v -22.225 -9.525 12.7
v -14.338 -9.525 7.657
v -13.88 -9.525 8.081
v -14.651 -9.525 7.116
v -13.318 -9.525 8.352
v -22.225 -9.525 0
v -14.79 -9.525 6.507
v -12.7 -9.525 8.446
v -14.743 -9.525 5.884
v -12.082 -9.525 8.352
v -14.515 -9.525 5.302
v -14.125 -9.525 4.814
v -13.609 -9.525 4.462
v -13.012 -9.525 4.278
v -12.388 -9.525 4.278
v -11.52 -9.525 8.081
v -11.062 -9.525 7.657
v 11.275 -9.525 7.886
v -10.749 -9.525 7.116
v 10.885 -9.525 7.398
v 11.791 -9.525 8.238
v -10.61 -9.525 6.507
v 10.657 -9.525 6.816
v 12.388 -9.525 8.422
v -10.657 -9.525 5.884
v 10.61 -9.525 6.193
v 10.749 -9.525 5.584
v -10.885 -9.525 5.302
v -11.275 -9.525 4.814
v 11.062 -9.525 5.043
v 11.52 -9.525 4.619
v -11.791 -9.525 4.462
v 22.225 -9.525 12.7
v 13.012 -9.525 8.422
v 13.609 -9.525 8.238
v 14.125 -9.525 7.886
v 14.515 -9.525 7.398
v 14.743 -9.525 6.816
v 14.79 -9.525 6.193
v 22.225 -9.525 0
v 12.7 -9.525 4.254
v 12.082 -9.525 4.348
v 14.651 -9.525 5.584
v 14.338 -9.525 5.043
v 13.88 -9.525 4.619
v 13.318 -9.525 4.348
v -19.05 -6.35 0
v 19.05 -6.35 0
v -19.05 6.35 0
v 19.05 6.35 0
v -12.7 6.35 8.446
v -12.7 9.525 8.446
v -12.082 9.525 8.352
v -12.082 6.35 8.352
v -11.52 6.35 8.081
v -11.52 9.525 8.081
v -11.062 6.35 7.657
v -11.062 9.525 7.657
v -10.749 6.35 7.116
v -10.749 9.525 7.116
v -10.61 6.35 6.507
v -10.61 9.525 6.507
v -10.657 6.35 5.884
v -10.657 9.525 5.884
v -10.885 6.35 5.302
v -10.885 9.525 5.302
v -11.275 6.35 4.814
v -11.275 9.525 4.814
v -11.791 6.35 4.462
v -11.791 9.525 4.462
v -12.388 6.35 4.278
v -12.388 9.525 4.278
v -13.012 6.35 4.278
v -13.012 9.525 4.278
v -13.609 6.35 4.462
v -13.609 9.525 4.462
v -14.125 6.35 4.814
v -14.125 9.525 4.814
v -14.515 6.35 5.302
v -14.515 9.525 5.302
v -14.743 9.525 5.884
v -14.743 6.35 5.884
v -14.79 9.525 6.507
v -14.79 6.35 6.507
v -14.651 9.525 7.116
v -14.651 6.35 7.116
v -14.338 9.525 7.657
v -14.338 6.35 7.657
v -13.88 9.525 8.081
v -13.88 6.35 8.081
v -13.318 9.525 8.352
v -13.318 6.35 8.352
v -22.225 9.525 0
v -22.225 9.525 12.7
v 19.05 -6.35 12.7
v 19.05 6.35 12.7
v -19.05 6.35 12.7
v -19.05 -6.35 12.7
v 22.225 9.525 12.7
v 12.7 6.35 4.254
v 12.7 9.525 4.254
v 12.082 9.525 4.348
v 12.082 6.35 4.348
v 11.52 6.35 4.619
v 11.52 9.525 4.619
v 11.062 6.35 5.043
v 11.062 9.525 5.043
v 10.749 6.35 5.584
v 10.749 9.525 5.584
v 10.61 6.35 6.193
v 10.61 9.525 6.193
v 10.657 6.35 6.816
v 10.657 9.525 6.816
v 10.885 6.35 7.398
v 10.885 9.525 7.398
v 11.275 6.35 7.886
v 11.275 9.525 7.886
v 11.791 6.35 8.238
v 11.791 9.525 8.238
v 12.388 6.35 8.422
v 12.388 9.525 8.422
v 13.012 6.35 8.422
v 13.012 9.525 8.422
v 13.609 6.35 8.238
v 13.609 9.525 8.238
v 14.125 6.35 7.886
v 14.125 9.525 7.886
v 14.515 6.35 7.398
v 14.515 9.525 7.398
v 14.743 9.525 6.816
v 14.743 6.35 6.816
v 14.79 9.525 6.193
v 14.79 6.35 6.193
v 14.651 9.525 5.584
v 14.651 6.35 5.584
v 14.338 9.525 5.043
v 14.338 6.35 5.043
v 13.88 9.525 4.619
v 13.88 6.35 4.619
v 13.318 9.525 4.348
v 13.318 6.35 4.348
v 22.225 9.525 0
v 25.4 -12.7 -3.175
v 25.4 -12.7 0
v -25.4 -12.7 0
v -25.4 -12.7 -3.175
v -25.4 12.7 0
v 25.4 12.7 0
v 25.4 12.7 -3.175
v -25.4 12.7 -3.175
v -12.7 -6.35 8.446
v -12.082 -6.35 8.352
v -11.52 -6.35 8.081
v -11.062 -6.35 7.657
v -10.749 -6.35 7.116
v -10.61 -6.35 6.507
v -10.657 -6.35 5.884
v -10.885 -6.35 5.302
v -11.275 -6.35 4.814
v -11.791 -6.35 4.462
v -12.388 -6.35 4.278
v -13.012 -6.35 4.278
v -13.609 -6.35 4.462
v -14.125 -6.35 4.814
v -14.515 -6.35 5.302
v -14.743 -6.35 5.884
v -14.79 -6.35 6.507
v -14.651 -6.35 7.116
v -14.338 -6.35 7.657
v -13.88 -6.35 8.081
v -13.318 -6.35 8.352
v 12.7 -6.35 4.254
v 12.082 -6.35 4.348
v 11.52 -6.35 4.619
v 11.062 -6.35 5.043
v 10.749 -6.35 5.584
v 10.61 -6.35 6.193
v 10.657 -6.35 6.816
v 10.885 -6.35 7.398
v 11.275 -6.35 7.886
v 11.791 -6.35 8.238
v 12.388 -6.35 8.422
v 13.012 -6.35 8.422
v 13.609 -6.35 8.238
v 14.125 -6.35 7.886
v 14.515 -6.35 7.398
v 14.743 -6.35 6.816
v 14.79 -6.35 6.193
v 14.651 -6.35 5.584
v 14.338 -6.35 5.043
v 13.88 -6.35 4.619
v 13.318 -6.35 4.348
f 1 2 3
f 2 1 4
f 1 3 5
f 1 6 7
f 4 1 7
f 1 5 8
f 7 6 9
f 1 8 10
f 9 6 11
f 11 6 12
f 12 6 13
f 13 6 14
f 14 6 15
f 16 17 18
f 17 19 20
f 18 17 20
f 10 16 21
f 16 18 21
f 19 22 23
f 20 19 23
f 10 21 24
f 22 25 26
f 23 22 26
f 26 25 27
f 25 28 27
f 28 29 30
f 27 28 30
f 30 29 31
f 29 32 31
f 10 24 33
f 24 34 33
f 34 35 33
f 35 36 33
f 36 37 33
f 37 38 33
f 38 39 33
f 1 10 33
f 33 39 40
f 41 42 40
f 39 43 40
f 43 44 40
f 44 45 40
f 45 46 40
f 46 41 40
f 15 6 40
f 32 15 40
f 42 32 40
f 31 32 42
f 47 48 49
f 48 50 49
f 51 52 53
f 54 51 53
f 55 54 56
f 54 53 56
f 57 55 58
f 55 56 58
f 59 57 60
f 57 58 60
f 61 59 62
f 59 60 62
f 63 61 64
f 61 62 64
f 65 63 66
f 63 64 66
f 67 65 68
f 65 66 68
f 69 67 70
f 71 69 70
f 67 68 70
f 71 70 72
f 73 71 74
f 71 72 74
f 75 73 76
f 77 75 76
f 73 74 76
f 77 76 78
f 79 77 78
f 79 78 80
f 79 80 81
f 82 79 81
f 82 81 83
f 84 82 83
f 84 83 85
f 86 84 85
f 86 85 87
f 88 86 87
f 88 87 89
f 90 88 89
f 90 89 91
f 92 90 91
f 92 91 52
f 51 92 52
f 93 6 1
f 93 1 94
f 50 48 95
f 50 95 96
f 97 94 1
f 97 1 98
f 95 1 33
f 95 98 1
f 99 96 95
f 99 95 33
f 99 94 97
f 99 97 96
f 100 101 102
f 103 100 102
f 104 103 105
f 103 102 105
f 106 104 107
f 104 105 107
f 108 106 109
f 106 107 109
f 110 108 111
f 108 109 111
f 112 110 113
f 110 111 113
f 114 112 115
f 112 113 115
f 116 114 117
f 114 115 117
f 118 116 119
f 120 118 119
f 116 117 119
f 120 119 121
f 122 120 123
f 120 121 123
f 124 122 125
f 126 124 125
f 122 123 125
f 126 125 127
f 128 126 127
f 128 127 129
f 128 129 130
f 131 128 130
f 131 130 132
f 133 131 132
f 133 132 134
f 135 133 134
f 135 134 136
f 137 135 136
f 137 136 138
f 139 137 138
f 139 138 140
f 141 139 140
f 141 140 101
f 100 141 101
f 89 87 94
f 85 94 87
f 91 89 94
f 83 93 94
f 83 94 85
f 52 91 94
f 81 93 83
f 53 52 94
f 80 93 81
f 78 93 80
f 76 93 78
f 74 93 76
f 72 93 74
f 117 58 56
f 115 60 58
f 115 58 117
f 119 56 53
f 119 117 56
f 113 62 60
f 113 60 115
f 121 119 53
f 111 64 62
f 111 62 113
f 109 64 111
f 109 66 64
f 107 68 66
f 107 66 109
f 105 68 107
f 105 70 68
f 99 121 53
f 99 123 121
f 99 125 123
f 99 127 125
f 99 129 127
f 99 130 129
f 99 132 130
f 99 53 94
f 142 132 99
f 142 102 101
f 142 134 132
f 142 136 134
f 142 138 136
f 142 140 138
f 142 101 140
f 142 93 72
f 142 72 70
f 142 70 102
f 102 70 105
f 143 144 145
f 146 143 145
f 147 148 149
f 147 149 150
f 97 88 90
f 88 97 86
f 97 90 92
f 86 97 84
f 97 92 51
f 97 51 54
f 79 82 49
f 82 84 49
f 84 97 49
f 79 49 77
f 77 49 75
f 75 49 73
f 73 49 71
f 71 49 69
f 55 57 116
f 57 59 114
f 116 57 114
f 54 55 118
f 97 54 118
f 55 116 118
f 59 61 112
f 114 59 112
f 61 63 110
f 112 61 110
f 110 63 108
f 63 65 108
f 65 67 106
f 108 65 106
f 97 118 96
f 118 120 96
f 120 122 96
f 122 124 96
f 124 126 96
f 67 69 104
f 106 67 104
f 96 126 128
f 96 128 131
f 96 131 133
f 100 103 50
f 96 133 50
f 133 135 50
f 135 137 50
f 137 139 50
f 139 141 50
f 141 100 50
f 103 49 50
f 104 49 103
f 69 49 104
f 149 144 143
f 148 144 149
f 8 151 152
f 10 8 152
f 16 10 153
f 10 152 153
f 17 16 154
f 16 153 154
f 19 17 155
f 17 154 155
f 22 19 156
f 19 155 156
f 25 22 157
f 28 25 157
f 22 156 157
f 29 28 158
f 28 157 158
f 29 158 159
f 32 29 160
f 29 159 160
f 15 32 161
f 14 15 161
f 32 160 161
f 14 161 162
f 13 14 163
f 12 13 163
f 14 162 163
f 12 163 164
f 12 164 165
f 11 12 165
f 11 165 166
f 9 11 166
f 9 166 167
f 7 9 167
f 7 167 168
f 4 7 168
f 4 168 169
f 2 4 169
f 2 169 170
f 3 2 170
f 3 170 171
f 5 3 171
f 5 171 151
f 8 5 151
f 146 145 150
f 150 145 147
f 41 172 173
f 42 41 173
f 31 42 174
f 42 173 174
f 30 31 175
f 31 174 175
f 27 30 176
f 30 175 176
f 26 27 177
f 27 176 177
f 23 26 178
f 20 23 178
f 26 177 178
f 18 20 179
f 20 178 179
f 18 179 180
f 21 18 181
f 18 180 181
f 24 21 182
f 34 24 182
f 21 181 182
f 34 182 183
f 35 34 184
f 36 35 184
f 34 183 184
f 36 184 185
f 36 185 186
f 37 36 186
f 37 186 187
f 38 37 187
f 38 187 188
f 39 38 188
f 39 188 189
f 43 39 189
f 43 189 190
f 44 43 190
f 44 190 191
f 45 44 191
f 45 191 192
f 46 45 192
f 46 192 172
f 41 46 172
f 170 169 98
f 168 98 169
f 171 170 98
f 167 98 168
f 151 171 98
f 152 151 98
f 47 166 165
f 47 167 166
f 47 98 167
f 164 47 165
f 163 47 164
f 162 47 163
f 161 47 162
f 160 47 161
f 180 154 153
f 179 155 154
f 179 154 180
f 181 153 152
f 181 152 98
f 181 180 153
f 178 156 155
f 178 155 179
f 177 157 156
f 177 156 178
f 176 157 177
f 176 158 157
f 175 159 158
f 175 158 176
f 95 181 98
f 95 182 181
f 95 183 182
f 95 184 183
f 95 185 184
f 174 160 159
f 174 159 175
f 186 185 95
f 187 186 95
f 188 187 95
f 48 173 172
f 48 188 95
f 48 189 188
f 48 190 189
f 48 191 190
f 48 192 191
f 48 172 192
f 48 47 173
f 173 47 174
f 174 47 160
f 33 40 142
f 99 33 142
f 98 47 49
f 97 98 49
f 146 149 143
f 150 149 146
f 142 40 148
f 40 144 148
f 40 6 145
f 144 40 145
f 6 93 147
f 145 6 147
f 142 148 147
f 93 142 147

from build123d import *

# Parameters (mm, degrees)
SKETCH1_W           = 44.45
SKETCH1_H           = 19.05
SKETCH1_W_2         = 38.1
SKETCH1_H_2         = 12.7
BOSS_EXTRUDE1_DEPTH = 12.7
CUT_EXTRUDE1_REACH  = 33.908
SKETCH2_R           = 2.0955
SKETCH3_W           = 50.8
SKETCH3_H           = 25.4
BOSS_EXTRUDE2_DEPTH = 3.175


with BuildPart() as part:
    # Sketch1 → Boss-Extrude1 (new body)
    with BuildSketch(Plane.XY):
        Rectangle(SKETCH1_W, SKETCH1_H)
        Rectangle(SKETCH1_W_2, SKETCH1_H_2, mode=Mode.SUBTRACT)
    extrude(amount=BOSS_EXTRUDE1_DEPTH)

    # Cut-Extrude1: up to this face of the body (flat: up to its plane)
    cut_extrude1_end = Plane(part.part.faces().sort_by_distance((0, -9.525, 6.35))[0])
    # Sketch2 → Cut-Extrude1 (cut, up to the picked face)
    with BuildSketch(Plane(origin=(0, 9.525, 0), x_dir=(1, 0, 0), z_dir=(0, 1, 0)), mode=Mode.PRIVATE) as cut_extrude1_sk1:
        with Locations(Location((-12.7, -6.35, 0), (0, 0, 270))):
            Circle(SKETCH2_R)
    cut_extrude1_tool1 = split(extrude(cut_extrude1_sk1.sketch, amount=-CUT_EXTRUDE1_REACH, mode=Mode.PRIVATE), bisect_by=cut_extrude1_end, keep=Keep.BOTH, mode=Mode.PRIVATE)
    # Sketch2 → Cut-Extrude1 (cut, up to the picked face)
    with BuildSketch(Plane(origin=(0, 9.525, 0), x_dir=(1, 0, 0), z_dir=(0, 1, 0)), mode=Mode.PRIVATE) as cut_extrude1_sk2:
        with Locations(Location((12.7, -6.35, 0), (0, 0, 90))):
            Circle(SKETCH2_R)
    cut_extrude1_tool2 = split(extrude(cut_extrude1_sk2.sketch, amount=-CUT_EXTRUDE1_REACH, mode=Mode.PRIVATE), bisect_by=cut_extrude1_end, keep=Keep.BOTH, mode=Mode.PRIVATE)
    add(cut_extrude1_tool1.solids().sort_by(Axis((-12.7, 9.525, 6.35), (0, -1, 0)))[0], mode=Mode.SUBTRACT)
    add(cut_extrude1_tool2.solids().sort_by(Axis((12.7, 9.525, 6.35), (0, -1, 0)))[0], mode=Mode.SUBTRACT)

    # Sketch3 → Boss-Extrude2 (add)
    with BuildSketch(Plane(origin=(0, 0, 0), x_dir=(-1, 0, 0), z_dir=(0, 0, -1))):
        Rectangle(SKETCH3_W, SKETCH3_H)
    extrude(amount=BOSS_EXTRUDE2_DEPTH)


solid = part.part
